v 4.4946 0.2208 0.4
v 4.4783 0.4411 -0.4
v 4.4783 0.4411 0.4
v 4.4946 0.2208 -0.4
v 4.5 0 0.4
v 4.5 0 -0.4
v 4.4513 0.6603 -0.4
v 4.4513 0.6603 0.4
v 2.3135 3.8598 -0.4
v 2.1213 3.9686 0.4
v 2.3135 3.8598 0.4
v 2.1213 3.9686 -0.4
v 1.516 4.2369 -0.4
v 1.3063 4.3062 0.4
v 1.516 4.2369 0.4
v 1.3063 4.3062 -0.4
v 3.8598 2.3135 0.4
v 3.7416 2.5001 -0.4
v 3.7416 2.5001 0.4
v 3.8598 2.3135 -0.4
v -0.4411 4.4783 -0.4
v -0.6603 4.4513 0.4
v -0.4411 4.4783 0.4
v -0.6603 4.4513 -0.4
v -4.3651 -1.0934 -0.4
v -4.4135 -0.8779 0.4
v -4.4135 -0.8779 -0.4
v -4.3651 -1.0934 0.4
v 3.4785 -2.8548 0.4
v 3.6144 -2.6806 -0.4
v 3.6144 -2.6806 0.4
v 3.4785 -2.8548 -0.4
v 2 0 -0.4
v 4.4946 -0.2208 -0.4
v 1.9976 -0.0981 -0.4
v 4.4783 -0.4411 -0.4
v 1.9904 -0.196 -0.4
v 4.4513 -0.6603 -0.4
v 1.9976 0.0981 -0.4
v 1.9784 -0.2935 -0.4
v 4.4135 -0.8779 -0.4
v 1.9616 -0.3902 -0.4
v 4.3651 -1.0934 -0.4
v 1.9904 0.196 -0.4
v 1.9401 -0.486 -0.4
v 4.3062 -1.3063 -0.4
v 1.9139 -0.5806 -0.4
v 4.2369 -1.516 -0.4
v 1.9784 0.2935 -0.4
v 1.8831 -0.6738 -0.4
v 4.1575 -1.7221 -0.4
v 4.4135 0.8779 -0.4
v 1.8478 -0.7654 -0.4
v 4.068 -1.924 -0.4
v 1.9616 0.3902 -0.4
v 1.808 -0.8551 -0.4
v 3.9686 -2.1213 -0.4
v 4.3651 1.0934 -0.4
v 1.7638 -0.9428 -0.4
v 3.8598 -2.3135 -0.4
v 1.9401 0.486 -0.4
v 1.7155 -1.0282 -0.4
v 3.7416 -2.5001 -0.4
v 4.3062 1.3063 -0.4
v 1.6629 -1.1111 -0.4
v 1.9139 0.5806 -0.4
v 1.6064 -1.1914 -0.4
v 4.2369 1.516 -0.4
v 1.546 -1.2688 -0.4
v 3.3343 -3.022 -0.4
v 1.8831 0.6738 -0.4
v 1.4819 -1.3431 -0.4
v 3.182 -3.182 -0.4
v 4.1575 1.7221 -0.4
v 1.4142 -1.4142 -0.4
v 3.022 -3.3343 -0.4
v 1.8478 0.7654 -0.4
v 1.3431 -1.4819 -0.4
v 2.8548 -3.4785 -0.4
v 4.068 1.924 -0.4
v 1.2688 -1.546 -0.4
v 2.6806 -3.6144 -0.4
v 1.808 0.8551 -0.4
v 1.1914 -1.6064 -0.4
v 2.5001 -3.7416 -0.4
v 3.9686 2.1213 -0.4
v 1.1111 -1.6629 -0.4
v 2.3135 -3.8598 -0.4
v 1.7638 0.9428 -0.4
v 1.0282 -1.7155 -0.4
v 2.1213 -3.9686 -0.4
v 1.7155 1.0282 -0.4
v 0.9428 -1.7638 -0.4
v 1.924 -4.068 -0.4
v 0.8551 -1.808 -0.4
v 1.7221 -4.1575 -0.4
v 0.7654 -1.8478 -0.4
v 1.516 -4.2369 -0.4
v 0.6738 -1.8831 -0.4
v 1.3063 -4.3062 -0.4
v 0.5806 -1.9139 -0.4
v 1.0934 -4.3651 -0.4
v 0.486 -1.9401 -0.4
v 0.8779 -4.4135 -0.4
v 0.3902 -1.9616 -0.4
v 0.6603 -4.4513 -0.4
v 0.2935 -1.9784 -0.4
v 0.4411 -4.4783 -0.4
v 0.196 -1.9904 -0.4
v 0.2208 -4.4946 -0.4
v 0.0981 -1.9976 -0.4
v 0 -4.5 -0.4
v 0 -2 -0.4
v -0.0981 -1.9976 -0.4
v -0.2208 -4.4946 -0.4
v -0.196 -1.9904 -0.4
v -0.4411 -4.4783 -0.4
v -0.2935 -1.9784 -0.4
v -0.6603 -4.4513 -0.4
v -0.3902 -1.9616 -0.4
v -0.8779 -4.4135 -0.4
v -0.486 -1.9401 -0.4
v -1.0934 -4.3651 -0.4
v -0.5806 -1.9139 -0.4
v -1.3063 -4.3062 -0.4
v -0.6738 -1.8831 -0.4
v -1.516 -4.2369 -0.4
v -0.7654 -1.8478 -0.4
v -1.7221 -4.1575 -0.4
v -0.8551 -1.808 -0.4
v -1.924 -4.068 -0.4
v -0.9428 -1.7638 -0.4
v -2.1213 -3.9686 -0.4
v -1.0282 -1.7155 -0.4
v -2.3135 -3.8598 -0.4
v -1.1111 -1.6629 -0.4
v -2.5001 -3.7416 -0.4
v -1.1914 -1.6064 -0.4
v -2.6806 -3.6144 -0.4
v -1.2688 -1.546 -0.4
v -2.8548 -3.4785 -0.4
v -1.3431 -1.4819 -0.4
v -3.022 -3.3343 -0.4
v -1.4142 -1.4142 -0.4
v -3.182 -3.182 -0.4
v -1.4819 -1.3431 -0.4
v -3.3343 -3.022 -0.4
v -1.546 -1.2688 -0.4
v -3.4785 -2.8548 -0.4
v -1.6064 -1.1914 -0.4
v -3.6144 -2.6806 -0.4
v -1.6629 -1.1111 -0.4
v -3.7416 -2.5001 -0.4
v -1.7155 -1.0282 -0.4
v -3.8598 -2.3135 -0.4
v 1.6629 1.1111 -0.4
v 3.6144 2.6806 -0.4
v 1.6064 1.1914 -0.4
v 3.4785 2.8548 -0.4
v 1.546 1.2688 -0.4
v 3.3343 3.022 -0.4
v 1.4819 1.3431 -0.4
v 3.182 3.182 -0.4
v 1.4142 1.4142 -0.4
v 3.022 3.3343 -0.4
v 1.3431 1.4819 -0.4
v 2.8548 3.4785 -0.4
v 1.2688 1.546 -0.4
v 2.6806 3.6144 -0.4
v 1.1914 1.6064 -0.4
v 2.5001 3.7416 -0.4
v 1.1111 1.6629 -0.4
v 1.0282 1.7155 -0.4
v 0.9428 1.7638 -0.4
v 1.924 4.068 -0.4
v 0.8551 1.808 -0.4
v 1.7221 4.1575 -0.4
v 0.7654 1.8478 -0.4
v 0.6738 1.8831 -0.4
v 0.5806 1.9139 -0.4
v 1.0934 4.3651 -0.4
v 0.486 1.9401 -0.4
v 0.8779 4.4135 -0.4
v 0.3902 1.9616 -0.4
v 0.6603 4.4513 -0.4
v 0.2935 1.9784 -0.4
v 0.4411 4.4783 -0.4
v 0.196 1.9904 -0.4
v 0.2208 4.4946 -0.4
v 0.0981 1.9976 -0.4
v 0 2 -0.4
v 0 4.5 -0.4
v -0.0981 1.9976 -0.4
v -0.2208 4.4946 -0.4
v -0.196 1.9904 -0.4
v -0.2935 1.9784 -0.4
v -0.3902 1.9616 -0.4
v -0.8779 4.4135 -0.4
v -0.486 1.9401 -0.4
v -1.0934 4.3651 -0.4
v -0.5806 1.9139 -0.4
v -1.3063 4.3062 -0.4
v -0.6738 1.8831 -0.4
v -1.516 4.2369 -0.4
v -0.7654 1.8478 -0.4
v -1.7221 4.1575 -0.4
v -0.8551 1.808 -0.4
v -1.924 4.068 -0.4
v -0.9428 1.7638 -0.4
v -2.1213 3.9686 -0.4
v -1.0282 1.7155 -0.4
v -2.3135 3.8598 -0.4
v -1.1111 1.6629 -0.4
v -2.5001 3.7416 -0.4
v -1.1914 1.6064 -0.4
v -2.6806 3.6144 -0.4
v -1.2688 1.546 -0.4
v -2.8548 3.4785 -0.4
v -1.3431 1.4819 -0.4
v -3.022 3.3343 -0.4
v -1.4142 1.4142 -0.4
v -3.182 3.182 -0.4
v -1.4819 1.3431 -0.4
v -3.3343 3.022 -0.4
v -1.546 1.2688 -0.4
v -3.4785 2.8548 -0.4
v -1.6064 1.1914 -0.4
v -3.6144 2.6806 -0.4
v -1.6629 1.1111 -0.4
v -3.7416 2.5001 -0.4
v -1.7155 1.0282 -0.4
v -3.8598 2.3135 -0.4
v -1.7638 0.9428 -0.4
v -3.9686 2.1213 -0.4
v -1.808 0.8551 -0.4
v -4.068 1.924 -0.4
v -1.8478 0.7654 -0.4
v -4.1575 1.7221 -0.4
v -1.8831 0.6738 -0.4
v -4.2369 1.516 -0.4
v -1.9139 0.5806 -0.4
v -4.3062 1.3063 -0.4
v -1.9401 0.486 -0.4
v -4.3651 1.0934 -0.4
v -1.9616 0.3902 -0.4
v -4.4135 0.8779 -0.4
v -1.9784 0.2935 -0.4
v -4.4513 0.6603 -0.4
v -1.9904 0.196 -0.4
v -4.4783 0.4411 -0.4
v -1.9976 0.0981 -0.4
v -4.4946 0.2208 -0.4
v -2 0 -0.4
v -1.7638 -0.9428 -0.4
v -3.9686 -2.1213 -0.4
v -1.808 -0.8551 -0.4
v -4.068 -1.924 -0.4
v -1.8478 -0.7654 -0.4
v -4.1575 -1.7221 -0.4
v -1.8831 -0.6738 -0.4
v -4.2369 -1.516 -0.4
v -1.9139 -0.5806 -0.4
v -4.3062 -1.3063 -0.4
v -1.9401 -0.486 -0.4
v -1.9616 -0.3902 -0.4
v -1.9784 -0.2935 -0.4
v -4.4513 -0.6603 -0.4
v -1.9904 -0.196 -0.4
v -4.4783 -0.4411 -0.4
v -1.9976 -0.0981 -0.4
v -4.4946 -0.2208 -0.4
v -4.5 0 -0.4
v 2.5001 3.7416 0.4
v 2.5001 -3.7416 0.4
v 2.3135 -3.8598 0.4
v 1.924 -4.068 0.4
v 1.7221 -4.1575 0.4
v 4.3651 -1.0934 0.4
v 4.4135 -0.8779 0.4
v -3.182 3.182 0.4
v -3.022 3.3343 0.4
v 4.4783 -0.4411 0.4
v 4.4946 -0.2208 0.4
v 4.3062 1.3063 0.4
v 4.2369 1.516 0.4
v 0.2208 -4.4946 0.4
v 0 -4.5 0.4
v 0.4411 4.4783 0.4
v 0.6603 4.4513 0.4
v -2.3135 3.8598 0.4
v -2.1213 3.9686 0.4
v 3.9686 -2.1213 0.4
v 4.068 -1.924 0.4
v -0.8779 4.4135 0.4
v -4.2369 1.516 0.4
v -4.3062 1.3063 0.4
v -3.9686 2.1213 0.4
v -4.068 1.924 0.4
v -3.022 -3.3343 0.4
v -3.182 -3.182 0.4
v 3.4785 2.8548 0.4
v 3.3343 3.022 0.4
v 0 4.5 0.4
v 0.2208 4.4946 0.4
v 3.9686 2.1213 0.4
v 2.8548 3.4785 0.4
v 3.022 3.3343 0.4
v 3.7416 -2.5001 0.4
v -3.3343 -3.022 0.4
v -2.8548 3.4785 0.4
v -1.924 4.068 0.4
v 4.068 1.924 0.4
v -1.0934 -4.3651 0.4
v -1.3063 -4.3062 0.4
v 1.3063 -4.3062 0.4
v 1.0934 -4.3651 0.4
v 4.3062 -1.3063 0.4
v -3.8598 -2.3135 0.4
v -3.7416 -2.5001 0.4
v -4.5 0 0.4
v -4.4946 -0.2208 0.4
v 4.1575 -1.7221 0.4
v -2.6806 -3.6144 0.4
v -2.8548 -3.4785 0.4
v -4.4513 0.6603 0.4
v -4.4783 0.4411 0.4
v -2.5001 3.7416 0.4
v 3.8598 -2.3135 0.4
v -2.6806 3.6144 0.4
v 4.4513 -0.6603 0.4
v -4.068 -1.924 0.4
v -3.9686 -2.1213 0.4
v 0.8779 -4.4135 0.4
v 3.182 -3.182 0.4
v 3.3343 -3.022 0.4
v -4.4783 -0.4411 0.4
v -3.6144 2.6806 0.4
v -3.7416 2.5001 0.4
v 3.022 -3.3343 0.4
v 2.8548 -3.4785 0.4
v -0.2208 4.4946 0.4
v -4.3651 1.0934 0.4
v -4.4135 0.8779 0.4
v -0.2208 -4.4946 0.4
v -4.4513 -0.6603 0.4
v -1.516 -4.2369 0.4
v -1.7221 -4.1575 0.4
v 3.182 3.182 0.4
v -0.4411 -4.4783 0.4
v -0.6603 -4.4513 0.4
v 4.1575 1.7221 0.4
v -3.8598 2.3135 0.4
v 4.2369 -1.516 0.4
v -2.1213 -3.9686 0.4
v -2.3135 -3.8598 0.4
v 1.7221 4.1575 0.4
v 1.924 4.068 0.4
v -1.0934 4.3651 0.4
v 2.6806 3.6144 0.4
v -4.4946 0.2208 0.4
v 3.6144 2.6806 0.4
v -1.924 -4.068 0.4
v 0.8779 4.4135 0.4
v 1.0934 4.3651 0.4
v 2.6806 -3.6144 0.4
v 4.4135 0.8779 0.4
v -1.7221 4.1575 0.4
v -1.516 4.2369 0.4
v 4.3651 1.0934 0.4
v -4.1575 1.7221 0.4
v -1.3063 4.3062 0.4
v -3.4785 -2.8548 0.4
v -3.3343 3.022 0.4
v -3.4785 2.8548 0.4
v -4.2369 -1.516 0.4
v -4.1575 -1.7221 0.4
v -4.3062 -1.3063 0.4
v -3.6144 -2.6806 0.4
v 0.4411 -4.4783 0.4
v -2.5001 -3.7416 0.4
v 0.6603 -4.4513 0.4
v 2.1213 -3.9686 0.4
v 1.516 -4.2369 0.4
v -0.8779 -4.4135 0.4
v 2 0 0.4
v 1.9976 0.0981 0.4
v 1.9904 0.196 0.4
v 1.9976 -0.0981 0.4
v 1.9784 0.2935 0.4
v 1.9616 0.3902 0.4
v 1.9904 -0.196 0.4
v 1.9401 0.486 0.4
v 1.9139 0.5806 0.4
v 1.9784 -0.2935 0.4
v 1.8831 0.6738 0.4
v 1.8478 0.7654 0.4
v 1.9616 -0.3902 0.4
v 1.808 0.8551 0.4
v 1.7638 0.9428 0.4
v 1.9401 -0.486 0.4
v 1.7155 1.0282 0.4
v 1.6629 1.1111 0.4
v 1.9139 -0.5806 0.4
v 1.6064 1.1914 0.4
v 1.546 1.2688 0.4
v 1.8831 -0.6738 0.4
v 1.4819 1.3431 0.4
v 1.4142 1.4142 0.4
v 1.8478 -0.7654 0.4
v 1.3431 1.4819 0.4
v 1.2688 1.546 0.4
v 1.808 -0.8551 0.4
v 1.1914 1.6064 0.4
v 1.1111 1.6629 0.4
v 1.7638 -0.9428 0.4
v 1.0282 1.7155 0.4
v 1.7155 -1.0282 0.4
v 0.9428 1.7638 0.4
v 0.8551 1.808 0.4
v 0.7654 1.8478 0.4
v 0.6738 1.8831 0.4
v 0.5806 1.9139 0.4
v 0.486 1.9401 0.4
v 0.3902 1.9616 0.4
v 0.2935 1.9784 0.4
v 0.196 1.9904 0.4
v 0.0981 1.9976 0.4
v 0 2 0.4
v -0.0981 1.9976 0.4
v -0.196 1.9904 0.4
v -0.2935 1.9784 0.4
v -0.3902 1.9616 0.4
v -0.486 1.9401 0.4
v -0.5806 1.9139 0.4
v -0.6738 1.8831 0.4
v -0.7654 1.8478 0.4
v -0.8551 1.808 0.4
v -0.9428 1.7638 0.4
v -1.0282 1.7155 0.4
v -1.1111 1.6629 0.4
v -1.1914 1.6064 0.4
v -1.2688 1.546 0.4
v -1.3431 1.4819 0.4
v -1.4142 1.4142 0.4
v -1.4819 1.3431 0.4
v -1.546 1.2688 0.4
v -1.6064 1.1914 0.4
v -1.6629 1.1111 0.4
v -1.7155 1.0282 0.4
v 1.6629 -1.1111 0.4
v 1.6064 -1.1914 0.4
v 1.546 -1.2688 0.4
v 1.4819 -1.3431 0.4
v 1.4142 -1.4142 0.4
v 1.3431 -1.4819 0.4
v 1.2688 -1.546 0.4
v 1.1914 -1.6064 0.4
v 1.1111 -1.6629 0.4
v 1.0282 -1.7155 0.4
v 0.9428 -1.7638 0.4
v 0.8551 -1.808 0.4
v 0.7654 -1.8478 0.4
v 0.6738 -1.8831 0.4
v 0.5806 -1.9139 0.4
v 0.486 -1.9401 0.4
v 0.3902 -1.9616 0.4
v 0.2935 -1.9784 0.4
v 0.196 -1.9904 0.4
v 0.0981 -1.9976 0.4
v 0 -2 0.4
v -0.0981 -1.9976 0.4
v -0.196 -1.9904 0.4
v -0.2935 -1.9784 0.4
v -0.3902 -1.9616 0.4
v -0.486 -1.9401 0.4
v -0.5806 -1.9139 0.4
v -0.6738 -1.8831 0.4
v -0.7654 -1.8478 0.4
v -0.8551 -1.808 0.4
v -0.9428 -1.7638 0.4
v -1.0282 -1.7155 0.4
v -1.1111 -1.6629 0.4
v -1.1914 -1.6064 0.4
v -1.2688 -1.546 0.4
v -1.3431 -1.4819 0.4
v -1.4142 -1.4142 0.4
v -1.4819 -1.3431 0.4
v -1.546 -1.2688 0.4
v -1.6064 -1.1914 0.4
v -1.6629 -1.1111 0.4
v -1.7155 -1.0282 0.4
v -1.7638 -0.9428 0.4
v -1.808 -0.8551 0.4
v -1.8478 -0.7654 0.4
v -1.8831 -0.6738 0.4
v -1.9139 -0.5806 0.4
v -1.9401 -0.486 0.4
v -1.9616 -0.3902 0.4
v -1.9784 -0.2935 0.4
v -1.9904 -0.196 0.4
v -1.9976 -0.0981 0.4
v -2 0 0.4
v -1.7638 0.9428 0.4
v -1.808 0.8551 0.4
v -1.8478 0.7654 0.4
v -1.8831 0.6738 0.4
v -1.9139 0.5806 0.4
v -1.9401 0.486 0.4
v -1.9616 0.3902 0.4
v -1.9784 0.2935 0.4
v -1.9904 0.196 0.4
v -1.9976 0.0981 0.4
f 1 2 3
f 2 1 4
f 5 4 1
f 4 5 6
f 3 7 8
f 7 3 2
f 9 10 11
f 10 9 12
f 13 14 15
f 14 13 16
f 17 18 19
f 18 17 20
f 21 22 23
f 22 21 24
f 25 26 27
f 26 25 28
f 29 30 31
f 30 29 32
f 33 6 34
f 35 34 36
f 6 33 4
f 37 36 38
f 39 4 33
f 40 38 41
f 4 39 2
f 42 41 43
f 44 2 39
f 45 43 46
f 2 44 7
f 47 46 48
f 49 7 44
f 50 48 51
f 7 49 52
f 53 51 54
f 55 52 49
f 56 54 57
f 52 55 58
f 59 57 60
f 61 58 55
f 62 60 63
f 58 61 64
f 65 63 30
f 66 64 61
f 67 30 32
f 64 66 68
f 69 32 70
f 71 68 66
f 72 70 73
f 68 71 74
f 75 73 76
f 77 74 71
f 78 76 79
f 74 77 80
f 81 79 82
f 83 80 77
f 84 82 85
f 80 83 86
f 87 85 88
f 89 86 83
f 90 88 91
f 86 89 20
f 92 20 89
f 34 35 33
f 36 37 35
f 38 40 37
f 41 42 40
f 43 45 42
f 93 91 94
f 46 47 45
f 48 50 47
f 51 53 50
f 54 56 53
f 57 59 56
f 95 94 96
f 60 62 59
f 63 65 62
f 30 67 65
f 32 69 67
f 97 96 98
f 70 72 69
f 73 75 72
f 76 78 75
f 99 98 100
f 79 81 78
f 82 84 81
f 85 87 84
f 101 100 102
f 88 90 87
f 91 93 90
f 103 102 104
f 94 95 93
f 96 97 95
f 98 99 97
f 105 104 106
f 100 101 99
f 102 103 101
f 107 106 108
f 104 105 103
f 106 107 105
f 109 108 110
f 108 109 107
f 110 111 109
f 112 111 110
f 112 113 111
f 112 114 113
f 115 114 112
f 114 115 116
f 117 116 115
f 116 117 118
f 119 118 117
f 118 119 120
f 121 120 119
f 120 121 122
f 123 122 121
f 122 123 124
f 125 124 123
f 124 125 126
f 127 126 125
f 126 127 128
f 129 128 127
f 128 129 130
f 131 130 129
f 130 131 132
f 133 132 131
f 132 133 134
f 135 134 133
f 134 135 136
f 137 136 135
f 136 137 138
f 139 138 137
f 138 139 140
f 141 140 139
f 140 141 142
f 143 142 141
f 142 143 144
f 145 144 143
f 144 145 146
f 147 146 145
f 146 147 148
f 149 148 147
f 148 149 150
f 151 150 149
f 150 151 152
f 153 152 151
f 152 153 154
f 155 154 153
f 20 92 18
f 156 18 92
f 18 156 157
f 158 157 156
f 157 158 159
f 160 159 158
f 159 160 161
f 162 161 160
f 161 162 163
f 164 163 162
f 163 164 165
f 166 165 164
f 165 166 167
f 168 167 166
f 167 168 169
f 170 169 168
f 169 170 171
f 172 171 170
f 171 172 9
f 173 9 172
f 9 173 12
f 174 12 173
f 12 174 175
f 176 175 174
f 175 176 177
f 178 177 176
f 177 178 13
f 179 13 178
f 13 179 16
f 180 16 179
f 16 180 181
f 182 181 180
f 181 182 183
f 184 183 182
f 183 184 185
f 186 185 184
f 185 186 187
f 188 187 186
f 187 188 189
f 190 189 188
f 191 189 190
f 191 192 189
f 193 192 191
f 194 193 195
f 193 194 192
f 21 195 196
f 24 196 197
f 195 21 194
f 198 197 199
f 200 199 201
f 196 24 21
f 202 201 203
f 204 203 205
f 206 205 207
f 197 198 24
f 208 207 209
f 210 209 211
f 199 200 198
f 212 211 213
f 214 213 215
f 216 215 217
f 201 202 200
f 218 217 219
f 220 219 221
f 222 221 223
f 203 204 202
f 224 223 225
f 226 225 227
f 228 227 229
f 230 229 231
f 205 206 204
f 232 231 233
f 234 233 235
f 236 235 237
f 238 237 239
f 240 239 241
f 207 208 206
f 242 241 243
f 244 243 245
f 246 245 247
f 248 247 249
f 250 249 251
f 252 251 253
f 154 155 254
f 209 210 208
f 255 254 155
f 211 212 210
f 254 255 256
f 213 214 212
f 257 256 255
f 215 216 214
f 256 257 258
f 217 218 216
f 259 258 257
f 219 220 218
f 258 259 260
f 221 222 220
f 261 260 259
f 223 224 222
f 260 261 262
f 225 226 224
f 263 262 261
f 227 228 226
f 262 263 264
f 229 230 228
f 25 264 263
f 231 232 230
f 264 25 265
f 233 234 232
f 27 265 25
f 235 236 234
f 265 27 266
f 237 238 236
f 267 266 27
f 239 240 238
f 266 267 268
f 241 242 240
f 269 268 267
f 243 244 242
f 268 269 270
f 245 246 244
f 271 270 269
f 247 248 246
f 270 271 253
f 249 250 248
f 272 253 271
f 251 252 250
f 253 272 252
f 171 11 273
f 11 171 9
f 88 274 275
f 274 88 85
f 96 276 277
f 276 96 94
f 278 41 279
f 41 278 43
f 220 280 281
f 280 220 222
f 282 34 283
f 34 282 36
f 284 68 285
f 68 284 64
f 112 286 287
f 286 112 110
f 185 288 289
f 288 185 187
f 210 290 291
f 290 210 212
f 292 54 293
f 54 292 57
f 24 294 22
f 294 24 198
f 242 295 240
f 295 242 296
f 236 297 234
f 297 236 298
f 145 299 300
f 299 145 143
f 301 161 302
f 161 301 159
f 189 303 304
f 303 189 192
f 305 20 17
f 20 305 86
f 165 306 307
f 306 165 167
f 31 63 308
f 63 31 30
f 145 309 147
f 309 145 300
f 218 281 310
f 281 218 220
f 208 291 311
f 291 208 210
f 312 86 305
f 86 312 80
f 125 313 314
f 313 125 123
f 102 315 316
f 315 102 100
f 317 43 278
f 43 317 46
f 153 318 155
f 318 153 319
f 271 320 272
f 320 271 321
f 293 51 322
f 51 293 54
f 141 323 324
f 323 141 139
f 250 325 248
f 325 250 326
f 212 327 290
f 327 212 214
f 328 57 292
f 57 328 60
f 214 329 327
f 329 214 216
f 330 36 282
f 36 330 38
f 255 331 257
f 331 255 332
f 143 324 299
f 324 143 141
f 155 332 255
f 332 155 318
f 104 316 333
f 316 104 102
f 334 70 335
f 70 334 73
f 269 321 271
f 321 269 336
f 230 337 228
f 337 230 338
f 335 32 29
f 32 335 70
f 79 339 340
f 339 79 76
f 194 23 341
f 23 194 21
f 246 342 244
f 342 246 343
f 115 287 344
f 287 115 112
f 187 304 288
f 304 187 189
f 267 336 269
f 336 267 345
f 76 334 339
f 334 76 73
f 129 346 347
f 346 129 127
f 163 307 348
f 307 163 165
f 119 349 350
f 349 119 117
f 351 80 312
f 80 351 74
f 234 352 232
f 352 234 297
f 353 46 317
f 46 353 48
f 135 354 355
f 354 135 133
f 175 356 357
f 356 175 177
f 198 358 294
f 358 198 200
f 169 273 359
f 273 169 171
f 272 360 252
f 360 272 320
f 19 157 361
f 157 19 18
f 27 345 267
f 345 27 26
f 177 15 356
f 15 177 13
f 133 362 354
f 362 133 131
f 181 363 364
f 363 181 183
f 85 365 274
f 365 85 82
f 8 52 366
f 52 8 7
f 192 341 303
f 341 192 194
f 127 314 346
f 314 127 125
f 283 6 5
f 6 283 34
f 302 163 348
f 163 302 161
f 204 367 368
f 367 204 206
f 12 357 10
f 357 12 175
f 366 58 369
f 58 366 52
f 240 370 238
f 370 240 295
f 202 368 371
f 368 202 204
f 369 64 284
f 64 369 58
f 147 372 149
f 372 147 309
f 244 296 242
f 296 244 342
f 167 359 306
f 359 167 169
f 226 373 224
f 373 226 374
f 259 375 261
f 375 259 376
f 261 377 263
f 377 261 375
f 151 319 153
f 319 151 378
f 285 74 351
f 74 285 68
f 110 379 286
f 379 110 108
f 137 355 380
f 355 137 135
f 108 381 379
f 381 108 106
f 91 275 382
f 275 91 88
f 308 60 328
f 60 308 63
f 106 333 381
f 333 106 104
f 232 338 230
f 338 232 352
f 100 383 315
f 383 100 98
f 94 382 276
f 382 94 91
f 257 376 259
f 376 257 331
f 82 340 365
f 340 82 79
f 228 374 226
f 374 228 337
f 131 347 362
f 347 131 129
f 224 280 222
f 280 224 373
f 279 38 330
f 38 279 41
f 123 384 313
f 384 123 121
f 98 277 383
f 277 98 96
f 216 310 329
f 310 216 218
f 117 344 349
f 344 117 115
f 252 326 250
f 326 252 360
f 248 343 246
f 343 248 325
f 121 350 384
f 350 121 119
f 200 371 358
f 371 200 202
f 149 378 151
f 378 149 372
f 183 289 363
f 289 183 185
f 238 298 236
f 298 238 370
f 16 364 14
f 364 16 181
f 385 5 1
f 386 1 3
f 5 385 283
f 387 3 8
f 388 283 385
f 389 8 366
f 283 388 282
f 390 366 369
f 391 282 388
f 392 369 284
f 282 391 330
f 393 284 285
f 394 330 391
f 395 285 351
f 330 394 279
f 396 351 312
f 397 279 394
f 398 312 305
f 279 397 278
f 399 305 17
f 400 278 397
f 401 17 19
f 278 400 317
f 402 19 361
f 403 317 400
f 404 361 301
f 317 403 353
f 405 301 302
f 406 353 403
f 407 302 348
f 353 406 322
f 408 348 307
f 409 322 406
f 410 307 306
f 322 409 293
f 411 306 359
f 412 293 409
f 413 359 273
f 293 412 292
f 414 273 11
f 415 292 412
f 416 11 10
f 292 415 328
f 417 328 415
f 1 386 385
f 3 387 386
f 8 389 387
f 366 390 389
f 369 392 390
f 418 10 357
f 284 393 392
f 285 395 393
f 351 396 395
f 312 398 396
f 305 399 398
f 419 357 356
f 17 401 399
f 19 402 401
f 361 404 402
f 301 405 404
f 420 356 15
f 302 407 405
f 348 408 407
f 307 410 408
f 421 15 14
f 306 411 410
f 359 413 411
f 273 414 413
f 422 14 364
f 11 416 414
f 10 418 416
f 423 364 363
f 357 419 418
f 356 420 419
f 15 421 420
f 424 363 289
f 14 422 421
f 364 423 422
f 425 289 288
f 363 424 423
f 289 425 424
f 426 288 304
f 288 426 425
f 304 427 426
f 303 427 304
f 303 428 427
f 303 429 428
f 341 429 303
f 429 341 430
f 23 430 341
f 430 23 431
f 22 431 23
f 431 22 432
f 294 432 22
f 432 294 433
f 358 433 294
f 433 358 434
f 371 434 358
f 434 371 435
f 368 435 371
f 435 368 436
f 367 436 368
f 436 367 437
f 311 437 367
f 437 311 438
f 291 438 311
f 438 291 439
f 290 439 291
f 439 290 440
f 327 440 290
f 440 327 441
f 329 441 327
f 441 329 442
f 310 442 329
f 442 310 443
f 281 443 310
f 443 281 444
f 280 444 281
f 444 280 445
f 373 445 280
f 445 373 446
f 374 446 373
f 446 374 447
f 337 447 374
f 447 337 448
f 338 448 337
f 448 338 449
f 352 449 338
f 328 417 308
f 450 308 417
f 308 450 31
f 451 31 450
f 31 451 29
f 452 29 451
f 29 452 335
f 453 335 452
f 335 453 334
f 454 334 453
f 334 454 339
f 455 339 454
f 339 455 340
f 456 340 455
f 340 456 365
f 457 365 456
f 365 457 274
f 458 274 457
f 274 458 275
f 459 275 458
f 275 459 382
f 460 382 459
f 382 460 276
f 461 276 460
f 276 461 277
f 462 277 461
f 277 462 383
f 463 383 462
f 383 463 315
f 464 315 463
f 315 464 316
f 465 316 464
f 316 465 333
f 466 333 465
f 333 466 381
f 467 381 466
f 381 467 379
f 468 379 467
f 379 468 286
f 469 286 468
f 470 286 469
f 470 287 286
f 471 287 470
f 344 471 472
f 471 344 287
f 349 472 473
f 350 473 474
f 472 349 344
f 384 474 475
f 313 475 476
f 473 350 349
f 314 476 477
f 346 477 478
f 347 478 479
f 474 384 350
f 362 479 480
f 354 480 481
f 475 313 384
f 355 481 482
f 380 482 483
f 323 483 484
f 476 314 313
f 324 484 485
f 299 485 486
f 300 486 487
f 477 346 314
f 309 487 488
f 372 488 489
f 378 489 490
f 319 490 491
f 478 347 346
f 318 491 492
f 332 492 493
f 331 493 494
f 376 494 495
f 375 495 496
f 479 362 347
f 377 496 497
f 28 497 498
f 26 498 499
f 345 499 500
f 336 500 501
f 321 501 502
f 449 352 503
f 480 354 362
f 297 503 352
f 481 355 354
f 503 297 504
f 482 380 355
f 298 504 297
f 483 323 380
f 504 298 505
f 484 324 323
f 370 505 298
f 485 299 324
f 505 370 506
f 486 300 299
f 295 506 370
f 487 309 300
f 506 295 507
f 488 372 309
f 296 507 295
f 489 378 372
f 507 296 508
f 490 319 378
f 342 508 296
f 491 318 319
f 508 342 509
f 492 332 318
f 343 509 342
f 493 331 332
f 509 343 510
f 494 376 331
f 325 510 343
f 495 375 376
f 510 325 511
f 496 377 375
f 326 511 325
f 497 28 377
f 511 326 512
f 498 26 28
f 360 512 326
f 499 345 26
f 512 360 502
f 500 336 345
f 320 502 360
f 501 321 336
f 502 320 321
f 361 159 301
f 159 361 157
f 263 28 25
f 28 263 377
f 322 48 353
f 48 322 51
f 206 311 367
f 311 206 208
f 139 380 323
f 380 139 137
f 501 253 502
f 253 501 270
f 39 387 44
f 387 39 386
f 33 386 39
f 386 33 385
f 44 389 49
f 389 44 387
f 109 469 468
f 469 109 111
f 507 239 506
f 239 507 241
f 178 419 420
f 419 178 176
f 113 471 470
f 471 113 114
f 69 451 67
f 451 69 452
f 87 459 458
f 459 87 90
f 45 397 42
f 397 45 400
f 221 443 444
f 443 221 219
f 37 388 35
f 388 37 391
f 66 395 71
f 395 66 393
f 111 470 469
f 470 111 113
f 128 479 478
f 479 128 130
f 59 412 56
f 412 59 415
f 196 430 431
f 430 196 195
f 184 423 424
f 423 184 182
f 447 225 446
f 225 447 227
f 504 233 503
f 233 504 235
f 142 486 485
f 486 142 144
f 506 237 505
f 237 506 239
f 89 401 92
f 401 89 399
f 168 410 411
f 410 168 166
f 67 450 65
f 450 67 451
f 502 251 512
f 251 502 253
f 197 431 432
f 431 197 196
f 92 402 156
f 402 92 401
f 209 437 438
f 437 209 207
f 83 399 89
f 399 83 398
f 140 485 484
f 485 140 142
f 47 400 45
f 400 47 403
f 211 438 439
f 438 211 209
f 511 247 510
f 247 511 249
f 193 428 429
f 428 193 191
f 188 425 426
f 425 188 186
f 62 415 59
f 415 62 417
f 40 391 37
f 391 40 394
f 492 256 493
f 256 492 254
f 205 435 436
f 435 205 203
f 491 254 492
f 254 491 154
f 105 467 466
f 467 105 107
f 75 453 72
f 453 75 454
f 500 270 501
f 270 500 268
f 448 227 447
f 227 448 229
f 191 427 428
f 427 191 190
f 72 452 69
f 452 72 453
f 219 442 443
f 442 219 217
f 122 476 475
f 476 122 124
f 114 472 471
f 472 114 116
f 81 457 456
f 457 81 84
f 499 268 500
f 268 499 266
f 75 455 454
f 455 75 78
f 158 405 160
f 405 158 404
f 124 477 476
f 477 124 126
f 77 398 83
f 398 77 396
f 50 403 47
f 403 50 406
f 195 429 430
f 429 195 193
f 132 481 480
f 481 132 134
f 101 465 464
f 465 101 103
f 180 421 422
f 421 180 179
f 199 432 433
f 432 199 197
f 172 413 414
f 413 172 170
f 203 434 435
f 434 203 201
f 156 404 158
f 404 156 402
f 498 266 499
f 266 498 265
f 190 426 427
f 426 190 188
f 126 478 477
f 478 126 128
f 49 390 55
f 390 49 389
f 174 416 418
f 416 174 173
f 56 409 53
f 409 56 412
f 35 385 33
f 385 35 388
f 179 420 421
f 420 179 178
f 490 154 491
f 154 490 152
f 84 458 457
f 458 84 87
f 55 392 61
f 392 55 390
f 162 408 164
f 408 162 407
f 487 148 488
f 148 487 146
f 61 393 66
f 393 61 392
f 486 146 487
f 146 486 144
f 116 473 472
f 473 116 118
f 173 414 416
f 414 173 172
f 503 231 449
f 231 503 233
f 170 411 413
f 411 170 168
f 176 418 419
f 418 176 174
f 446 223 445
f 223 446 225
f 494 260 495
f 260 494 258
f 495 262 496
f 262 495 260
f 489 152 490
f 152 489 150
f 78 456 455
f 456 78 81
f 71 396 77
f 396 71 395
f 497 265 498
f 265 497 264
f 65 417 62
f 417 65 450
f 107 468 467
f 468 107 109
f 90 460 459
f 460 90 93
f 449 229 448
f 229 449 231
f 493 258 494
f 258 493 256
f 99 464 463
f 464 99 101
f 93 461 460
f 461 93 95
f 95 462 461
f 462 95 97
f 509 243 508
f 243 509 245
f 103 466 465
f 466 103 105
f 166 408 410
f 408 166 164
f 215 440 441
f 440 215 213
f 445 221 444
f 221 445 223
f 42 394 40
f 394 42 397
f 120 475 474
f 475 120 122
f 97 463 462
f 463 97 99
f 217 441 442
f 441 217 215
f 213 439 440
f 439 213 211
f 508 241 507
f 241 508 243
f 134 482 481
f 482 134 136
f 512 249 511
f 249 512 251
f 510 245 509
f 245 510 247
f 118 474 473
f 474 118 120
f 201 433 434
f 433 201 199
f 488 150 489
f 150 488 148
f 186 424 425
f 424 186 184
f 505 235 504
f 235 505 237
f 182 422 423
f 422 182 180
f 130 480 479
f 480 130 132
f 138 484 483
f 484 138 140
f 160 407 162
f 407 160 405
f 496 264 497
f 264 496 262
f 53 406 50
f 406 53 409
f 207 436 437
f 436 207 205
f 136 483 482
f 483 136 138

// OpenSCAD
// Flat washer: 4.0mm ID, 9.0mm OD, 0.8mm thickness

inner_diameter_mm = 4.0;   //[2:8:0.1]
outer_diameter_mm = 9.0;   //[5:18:0.1]
thickness_mm      = 0.8;   //[0.4:1.6:0.05]

$fn = 128;

difference() {
    cylinder(d=outer_diameter_mm, h=thickness_mm, center=true);
    cylinder(d=inner_diameter_mm, h=thickness_mm + 0.2, center=true);
}
